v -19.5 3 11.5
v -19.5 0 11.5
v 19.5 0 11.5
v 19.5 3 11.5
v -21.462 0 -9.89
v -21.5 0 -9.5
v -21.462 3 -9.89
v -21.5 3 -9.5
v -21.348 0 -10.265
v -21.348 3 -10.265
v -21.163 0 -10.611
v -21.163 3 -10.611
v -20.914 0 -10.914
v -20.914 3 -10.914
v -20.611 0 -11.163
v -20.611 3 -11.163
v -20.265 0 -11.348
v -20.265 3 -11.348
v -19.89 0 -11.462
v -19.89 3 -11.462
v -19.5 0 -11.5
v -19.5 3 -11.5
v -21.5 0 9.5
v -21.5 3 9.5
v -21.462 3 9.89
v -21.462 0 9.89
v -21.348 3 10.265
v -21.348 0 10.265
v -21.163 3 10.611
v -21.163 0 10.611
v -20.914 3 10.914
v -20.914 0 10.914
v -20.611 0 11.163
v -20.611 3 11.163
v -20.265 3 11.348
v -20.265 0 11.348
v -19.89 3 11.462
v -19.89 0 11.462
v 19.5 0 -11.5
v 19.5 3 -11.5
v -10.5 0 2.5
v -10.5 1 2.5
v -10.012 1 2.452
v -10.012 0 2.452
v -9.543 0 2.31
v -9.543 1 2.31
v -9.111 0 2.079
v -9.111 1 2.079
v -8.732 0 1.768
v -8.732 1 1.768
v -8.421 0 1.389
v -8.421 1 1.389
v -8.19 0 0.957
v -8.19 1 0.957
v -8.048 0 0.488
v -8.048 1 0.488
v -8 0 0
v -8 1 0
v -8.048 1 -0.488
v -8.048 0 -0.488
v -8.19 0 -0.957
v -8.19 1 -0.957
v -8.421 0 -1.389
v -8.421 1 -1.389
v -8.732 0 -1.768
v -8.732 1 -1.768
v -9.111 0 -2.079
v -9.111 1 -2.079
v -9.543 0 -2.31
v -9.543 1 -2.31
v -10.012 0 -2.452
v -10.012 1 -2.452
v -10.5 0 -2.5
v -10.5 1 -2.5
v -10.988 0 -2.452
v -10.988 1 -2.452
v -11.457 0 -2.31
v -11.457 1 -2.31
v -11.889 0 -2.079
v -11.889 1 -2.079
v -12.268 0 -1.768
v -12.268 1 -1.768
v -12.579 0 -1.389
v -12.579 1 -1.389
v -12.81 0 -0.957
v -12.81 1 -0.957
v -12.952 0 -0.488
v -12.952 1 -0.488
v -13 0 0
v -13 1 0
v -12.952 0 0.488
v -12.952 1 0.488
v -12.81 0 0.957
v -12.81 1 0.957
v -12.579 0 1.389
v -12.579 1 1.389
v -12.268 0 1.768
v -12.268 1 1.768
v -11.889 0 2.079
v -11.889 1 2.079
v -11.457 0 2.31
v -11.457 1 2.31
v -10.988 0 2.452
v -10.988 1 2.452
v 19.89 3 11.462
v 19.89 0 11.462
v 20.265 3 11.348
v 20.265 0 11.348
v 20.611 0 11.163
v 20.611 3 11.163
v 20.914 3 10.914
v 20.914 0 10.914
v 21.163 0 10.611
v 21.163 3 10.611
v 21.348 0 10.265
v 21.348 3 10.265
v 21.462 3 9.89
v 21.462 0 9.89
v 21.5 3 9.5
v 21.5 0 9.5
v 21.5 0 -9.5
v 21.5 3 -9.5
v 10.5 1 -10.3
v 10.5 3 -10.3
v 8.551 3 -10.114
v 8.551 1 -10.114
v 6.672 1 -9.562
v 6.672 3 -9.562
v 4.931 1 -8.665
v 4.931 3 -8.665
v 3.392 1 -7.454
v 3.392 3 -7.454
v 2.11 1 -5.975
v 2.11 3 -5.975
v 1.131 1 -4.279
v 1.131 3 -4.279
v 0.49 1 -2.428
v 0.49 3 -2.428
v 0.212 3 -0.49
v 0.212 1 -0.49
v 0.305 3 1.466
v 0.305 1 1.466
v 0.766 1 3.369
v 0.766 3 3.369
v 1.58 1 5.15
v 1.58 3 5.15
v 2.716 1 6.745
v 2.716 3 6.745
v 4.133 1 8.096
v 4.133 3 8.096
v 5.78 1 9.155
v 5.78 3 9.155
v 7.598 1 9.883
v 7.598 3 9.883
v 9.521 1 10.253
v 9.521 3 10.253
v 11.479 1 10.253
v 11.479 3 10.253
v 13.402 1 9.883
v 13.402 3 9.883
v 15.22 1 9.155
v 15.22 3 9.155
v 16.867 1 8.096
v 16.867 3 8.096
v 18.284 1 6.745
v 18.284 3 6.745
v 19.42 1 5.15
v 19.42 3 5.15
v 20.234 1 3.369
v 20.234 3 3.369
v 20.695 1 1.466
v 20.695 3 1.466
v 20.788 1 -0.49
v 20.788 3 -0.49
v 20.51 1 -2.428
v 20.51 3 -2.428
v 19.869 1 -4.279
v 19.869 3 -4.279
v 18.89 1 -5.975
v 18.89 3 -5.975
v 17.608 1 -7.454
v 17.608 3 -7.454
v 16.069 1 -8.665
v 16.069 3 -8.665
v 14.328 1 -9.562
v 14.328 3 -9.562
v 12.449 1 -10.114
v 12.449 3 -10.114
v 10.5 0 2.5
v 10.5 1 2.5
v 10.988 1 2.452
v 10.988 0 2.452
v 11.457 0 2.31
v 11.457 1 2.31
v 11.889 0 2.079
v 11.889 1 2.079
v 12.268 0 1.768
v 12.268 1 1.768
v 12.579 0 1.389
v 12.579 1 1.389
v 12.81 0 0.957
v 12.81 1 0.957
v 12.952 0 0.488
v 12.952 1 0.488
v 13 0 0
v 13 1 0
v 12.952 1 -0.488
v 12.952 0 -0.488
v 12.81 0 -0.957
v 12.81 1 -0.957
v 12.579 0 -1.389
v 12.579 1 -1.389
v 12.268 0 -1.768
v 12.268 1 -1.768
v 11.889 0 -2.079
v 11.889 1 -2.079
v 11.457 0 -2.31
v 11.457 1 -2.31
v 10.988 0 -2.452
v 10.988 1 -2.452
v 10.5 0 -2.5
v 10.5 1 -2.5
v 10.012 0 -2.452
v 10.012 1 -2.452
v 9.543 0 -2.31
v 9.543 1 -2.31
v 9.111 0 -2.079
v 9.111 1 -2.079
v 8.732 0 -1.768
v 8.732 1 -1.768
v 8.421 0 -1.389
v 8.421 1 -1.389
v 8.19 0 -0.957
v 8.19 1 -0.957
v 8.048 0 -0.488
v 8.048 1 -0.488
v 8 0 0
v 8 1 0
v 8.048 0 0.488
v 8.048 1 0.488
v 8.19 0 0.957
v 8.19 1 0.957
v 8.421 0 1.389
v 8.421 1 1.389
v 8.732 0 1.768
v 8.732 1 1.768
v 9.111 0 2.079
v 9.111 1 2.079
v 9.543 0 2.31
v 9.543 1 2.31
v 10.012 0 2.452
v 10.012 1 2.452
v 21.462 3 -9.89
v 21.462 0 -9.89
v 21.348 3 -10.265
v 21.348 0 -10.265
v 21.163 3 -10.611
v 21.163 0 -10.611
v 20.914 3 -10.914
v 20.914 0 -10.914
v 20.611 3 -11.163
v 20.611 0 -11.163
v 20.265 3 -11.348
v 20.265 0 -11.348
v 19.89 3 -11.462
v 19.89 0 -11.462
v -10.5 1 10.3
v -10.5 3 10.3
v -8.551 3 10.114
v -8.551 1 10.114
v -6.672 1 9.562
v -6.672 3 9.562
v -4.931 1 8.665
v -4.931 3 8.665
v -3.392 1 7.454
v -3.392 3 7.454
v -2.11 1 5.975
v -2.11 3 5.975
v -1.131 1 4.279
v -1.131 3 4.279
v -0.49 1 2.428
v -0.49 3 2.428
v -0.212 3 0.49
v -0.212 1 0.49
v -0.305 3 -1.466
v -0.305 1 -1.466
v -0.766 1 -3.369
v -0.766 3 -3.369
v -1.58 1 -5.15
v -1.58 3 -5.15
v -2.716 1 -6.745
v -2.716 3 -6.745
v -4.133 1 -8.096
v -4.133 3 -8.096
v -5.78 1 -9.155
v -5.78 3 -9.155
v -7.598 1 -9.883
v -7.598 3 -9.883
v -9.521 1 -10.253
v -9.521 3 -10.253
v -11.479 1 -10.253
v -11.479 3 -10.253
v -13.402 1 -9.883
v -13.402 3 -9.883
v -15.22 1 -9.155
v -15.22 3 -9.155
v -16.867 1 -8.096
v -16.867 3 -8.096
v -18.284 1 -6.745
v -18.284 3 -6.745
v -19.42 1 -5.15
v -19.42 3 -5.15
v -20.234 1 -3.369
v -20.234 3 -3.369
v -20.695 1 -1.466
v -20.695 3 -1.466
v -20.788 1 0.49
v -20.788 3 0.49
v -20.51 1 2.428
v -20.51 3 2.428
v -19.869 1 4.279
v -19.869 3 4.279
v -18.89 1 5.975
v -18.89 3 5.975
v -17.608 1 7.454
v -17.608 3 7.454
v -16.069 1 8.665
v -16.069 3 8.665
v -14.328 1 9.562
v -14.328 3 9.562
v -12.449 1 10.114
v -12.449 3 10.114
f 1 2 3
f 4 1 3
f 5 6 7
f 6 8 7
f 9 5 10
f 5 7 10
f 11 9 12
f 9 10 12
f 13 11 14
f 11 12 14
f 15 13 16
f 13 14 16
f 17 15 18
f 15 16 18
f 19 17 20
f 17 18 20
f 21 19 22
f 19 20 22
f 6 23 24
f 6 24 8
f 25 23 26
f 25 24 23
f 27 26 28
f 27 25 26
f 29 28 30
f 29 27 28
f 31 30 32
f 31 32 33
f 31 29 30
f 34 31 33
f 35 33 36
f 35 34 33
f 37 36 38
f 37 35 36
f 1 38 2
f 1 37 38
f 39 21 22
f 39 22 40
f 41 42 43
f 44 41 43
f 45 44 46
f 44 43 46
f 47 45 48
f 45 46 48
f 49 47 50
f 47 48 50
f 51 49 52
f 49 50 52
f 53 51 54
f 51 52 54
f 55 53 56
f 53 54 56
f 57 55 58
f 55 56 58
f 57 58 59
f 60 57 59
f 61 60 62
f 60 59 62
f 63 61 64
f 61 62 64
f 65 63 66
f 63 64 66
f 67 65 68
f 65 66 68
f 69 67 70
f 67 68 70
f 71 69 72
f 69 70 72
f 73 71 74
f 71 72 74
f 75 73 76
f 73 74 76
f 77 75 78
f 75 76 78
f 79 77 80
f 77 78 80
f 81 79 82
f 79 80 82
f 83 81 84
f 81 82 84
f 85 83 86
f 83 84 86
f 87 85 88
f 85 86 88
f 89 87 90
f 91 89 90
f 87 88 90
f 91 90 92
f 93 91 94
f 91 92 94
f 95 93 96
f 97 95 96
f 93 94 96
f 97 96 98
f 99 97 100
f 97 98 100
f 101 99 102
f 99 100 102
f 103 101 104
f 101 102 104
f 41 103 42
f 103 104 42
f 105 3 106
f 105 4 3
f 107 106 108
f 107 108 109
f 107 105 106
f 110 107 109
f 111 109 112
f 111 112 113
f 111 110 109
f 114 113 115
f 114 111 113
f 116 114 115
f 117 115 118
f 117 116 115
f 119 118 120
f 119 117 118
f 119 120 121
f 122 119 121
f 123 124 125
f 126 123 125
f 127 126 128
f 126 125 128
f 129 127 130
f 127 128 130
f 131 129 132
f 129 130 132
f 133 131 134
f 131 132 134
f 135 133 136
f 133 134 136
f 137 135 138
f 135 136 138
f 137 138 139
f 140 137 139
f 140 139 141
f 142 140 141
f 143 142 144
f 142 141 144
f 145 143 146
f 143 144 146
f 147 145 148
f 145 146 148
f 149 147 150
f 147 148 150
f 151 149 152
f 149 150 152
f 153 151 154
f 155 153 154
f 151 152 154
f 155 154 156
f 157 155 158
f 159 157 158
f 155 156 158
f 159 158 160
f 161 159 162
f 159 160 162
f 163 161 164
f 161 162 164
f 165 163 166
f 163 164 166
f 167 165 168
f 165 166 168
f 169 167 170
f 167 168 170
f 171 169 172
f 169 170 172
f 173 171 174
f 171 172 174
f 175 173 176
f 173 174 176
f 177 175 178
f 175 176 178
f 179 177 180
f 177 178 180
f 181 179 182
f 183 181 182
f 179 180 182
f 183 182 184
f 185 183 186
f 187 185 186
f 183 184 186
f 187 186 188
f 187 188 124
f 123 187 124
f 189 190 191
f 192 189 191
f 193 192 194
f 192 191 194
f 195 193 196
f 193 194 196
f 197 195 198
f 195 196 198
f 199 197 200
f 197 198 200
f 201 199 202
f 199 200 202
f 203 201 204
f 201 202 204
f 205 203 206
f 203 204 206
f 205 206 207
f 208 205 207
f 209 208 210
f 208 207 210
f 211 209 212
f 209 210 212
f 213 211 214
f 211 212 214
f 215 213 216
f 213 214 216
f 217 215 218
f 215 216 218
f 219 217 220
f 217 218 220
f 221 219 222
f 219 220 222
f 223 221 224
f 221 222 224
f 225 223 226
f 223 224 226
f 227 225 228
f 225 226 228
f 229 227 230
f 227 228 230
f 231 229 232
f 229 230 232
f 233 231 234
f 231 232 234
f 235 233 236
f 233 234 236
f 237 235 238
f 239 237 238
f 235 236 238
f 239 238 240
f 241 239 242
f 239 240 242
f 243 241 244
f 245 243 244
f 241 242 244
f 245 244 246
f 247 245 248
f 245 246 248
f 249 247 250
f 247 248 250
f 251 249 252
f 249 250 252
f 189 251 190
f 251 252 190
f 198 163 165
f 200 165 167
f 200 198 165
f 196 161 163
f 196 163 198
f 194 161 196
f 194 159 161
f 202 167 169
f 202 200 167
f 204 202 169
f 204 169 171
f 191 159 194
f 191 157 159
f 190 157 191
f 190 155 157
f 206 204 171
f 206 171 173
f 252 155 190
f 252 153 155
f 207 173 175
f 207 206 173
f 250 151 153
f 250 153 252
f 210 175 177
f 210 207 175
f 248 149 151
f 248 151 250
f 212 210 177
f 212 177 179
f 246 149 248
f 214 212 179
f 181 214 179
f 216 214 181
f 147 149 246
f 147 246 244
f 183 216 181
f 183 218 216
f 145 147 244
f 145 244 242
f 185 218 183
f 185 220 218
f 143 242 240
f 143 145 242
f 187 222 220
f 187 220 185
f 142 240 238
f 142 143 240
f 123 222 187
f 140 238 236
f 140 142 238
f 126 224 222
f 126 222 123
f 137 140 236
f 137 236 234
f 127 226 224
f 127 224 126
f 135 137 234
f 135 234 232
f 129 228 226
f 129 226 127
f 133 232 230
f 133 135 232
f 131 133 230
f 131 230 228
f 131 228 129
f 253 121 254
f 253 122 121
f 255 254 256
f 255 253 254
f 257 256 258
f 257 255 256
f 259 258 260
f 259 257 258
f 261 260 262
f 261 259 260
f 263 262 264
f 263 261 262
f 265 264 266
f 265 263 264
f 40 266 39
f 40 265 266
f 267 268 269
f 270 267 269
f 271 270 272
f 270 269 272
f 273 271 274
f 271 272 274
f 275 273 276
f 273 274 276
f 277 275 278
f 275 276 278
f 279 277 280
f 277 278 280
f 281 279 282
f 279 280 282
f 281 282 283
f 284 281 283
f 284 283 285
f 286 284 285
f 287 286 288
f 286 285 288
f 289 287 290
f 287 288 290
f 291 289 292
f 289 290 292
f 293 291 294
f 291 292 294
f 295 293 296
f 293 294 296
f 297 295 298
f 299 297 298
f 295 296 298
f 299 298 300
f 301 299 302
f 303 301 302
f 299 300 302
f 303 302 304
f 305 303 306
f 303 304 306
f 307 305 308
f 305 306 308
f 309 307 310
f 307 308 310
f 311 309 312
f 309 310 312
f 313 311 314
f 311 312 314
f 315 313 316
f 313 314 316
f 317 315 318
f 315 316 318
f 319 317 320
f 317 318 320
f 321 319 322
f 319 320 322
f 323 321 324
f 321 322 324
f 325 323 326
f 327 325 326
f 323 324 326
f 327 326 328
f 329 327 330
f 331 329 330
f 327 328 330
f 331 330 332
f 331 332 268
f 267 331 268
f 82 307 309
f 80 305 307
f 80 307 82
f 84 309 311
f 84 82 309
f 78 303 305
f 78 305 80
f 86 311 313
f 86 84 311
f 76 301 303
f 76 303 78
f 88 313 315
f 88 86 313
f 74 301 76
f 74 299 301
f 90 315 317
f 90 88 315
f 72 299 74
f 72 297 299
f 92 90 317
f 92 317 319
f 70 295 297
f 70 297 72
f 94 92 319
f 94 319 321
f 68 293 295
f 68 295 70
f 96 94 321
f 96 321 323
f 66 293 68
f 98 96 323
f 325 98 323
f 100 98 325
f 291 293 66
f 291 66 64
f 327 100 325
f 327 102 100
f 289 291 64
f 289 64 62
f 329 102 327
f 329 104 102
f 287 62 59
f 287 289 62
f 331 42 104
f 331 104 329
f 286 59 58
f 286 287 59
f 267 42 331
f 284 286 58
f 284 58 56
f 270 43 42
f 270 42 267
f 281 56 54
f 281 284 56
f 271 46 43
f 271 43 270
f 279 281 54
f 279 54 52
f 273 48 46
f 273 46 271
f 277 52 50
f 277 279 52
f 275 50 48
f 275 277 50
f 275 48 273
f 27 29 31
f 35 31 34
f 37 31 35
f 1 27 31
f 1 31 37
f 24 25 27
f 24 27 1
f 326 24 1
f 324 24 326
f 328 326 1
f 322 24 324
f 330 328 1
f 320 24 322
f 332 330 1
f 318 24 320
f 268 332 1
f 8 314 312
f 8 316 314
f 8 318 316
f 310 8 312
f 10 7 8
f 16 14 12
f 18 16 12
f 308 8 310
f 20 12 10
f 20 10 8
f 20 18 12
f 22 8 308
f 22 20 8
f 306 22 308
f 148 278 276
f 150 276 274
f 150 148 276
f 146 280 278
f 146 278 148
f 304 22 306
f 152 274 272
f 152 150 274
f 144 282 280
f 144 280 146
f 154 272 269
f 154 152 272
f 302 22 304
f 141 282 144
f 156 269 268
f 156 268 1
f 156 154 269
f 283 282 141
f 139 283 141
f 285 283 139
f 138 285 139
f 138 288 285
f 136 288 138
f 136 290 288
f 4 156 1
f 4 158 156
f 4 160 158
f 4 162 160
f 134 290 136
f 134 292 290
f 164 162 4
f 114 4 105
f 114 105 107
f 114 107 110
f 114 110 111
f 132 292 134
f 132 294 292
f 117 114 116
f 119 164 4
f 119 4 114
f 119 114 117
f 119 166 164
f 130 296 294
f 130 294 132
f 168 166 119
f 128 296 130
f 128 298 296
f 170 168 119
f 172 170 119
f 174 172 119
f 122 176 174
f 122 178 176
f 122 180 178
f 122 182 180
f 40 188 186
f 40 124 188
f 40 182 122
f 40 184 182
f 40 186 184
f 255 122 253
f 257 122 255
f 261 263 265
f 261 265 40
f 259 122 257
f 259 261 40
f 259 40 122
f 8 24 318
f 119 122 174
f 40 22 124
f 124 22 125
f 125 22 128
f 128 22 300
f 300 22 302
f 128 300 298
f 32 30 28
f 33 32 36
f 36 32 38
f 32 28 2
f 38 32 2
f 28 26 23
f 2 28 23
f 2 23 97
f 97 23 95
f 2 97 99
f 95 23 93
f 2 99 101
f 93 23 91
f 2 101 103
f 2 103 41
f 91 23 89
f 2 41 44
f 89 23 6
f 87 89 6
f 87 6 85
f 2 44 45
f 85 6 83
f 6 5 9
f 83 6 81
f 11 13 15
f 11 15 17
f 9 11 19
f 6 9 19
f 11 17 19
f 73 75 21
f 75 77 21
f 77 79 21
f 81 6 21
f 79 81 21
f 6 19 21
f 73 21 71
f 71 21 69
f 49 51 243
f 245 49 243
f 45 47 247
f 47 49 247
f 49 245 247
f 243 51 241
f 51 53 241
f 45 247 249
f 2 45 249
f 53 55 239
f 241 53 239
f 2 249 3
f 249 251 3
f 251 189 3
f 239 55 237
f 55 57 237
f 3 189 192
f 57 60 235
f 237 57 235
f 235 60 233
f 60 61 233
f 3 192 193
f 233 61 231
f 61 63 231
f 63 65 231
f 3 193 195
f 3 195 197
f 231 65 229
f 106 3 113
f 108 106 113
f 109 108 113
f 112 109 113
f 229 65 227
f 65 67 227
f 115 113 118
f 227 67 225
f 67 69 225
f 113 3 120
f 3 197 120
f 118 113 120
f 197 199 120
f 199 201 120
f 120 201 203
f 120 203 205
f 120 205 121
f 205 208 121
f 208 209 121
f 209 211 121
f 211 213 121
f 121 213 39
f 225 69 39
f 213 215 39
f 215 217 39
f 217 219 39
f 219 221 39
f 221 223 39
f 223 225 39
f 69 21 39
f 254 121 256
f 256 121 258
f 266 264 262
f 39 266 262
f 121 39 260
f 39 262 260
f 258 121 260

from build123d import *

# Parameters (mm, degrees)
CROQUIS1_W              = 43
CROQUIS1_H              = 23
SALIENTE_EXTRUIR1_DEPTH = 3
REDONDEO1_R             = 2
CROQUIS2_R              = 10.3
CORTAR_EXTRUIR1_DEPTH   = 2
CROQUIS3_R              = 2.5
CORTAR_EXTRUIR2_DEPTH   = 1


with BuildPart() as part:
    # Croquis1 → Saliente-Extruir1 (new body)
    with BuildSketch(Plane(origin=(0, 0, 0), x_dir=(1, 0, 0), z_dir=(0, 1, 0))):
        Rectangle(CROQUIS1_W, CROQUIS1_H)
    extrude(amount=SALIENTE_EXTRUIR1_DEPTH)

    # Redondeo1
    redondeo1_edges = [part.edges().sort_by_distance(p)[0] for p in [
        (21.5, 1.5, 11.5),
        (-21.5, 1.5, 11.5),
        (-21.5, 1.5, -11.5),
        (21.5, 1.5, -11.5),
    ]]
    fillet(redondeo1_edges, radius=REDONDEO1_R)

    # Croquis2 → Cortar-Extruir1 (cut)
    with BuildSketch(Plane(origin=(0, 3, 0), x_dir=(1, 0, 0), z_dir=(0, 1, 0))):
        with Locations(Location((-10.5, 0, 0), (0, 0, 270))):
            Circle(CROQUIS2_R)
        with Locations(Location((10.5, 0, 0), (0, 0, 90))):
            Circle(CROQUIS2_R)
    extrude(amount=-CORTAR_EXTRUIR1_DEPTH, mode=Mode.SUBTRACT)

    # Croquis3 → Cortar-Extruir2 (cut)
    with BuildSketch(Plane(origin=(0, 1, 0), x_dir=(1, 0, 0), z_dir=(0, 1, 0))):
        with Locations(Location((-10.5, 0, 0), (0, 0, 270))):
            Circle(CROQUIS3_R)
        with Locations(Location((10.5, 0, 0), (0, 0, 270))):
            Circle(CROQUIS3_R)
    extrude(amount=-CORTAR_EXTRUIR2_DEPTH, mode=Mode.SUBTRACT)


solid = part.part
